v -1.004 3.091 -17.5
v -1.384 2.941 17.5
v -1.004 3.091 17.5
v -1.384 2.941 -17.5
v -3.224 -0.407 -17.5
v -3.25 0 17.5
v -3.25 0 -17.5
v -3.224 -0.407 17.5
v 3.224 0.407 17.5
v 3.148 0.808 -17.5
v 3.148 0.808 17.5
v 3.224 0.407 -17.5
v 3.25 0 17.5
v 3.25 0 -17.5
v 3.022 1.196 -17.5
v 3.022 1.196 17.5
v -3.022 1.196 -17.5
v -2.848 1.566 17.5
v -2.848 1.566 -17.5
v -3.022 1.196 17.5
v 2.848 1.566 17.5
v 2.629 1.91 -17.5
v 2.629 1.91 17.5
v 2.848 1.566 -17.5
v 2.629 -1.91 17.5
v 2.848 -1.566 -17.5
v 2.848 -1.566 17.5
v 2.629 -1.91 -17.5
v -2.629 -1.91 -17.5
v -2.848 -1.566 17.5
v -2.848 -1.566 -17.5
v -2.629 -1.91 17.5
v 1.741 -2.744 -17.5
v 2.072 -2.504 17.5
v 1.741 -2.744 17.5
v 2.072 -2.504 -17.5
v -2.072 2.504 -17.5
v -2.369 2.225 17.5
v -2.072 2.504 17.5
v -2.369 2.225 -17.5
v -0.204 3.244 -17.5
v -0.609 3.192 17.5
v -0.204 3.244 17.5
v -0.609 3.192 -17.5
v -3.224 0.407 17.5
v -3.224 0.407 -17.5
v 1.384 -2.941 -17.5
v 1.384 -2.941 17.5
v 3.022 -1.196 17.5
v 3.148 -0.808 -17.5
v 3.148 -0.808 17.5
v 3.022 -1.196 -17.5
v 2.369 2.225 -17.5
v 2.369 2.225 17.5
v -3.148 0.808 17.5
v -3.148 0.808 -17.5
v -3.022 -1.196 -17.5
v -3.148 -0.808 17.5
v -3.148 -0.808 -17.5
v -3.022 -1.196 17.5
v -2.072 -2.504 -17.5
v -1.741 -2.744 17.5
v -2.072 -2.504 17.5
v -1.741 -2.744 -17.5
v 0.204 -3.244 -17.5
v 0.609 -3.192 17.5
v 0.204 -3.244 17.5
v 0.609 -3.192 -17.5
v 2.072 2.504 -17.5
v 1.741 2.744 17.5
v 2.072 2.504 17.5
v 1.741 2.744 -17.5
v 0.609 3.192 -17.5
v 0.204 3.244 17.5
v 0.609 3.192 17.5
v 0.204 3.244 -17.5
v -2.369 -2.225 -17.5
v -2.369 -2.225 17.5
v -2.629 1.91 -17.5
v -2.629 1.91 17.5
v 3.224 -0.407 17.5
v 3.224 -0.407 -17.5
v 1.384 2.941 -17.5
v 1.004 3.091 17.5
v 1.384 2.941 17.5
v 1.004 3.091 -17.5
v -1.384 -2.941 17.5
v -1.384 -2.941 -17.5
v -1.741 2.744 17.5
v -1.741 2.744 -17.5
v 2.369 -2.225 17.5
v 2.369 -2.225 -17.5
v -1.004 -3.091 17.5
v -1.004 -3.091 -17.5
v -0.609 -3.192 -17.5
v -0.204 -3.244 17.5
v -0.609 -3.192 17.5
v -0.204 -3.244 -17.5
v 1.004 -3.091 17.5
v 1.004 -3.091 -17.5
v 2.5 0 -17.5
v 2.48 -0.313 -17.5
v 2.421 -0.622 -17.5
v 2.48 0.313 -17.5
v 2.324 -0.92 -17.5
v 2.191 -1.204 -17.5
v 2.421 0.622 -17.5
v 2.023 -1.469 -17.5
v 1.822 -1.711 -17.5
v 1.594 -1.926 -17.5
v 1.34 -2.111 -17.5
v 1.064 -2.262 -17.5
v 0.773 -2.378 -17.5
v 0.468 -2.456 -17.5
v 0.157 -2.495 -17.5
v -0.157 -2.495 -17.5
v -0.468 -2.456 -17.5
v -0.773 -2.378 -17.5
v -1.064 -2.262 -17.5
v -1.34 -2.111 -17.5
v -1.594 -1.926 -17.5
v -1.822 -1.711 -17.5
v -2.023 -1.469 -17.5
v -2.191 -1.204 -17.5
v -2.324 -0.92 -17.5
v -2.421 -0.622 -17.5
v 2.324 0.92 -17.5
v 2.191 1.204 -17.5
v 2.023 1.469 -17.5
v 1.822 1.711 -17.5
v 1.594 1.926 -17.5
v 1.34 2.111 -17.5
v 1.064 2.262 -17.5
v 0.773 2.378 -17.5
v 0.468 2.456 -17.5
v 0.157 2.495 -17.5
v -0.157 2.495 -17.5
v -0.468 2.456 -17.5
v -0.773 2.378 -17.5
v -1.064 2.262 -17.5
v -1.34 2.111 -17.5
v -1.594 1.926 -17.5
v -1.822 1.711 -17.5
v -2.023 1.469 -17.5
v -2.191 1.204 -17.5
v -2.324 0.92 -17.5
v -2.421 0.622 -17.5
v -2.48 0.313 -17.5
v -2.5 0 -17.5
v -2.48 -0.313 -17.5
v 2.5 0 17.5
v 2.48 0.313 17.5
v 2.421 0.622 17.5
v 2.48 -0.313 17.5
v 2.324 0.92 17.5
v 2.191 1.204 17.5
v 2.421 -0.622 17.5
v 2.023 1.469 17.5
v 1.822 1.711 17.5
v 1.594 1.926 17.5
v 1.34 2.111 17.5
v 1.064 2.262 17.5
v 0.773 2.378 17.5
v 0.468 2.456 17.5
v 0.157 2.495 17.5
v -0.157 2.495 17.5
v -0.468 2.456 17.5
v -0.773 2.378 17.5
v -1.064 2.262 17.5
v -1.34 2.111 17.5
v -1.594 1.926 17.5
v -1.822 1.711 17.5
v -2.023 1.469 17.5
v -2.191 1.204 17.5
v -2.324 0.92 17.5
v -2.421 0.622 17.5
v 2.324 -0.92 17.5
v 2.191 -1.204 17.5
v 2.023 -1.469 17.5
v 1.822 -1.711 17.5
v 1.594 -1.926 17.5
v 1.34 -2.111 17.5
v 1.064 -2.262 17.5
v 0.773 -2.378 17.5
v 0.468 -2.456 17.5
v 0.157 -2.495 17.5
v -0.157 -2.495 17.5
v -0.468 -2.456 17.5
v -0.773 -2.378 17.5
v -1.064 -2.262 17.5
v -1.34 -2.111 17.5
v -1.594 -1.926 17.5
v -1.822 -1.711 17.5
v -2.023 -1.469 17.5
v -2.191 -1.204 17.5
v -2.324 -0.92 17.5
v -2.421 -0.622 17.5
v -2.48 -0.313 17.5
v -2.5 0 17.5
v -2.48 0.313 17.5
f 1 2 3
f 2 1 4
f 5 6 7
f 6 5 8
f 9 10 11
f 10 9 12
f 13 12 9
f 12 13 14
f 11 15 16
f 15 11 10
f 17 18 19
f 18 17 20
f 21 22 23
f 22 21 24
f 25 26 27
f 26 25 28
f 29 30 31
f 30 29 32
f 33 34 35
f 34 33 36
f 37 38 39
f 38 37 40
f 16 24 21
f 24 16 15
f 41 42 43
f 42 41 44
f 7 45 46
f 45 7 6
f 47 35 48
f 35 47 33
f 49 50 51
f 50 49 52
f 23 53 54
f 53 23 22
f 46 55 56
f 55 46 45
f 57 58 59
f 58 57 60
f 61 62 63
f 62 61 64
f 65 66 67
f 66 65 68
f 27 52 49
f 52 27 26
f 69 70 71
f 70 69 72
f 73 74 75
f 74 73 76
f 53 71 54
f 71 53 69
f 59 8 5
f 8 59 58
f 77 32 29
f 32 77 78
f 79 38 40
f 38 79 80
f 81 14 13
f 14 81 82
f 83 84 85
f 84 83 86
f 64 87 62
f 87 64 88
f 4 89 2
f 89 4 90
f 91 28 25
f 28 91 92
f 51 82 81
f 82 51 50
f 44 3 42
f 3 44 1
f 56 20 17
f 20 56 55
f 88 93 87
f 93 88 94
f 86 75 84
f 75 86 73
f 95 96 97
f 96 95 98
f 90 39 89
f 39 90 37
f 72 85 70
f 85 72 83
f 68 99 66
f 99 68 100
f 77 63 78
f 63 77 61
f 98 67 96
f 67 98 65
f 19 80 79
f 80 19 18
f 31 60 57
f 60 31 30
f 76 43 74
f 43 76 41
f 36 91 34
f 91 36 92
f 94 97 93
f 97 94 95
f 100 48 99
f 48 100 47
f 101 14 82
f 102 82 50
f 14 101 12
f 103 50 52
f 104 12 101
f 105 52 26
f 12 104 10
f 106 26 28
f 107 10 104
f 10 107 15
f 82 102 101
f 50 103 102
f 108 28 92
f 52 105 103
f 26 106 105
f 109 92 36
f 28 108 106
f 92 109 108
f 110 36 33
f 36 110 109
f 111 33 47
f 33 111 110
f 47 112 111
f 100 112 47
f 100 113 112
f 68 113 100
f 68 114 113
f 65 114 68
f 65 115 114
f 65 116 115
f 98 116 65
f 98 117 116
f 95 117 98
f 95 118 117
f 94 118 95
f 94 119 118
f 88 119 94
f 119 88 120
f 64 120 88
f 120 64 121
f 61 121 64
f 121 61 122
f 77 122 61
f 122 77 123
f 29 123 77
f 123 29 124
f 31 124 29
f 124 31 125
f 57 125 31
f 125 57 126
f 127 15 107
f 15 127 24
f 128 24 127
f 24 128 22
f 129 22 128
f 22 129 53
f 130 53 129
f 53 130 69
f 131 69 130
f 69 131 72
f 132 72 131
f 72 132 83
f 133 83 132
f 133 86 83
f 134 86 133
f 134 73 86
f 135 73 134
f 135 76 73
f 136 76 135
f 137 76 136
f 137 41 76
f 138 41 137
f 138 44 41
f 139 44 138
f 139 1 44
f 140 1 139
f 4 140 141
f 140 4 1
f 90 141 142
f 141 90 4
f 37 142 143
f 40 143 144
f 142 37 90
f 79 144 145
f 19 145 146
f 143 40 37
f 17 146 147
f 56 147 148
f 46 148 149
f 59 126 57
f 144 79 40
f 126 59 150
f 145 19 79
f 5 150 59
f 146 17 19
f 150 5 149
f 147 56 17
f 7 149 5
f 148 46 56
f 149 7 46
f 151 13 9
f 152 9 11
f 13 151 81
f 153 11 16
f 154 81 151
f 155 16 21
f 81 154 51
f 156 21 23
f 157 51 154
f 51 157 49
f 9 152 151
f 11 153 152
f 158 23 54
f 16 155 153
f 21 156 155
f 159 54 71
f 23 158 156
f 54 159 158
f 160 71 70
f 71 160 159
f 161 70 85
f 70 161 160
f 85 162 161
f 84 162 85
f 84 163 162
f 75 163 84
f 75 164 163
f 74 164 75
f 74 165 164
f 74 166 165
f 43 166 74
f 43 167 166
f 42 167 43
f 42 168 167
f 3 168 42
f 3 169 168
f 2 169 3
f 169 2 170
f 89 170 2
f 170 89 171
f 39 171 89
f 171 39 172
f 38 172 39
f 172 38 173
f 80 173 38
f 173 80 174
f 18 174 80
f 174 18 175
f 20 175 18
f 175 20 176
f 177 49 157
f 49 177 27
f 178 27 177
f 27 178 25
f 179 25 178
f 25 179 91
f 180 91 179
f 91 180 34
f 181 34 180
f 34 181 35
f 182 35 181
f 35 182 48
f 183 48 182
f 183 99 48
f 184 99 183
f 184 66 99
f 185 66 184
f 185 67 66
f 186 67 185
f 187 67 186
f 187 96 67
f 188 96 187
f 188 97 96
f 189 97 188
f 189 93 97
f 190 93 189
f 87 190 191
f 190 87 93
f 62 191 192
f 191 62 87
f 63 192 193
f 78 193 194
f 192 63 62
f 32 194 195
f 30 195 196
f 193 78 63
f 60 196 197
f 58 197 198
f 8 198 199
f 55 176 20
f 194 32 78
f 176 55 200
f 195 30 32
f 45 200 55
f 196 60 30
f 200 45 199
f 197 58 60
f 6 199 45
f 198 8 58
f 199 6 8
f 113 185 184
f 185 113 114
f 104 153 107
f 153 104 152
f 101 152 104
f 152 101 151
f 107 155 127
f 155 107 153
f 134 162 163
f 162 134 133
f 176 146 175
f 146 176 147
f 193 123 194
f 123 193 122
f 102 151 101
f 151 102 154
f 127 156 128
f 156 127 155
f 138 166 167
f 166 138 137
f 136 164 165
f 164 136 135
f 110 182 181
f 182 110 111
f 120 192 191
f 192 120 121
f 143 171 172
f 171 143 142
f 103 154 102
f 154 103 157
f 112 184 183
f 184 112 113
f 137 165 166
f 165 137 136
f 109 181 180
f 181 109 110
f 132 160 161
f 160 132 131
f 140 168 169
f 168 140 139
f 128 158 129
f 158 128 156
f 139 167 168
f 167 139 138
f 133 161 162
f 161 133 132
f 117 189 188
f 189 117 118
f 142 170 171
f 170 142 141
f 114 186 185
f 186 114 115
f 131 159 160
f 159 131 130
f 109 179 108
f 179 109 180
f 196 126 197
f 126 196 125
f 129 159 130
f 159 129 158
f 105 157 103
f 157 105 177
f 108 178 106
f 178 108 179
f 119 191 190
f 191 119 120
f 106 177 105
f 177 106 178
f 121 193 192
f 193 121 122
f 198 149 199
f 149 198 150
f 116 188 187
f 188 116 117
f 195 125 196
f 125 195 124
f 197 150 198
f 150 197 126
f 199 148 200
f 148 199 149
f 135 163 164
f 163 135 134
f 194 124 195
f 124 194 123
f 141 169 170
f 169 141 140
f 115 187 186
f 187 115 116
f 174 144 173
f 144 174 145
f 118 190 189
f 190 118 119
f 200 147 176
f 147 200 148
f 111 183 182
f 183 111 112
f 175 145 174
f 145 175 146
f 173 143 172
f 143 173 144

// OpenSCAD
$fn = 50;


difference() {
	union() {
		translate(v = [0, 0, -17.5000000000]) {
			cylinder(h = 35, r = 3.2500000000);
		}
	}
	union() {
		translate(v = [0, 0, -100.0000000000]) {
			cylinder(h = 200, r = 2.5000000000);
		}
	}
}
